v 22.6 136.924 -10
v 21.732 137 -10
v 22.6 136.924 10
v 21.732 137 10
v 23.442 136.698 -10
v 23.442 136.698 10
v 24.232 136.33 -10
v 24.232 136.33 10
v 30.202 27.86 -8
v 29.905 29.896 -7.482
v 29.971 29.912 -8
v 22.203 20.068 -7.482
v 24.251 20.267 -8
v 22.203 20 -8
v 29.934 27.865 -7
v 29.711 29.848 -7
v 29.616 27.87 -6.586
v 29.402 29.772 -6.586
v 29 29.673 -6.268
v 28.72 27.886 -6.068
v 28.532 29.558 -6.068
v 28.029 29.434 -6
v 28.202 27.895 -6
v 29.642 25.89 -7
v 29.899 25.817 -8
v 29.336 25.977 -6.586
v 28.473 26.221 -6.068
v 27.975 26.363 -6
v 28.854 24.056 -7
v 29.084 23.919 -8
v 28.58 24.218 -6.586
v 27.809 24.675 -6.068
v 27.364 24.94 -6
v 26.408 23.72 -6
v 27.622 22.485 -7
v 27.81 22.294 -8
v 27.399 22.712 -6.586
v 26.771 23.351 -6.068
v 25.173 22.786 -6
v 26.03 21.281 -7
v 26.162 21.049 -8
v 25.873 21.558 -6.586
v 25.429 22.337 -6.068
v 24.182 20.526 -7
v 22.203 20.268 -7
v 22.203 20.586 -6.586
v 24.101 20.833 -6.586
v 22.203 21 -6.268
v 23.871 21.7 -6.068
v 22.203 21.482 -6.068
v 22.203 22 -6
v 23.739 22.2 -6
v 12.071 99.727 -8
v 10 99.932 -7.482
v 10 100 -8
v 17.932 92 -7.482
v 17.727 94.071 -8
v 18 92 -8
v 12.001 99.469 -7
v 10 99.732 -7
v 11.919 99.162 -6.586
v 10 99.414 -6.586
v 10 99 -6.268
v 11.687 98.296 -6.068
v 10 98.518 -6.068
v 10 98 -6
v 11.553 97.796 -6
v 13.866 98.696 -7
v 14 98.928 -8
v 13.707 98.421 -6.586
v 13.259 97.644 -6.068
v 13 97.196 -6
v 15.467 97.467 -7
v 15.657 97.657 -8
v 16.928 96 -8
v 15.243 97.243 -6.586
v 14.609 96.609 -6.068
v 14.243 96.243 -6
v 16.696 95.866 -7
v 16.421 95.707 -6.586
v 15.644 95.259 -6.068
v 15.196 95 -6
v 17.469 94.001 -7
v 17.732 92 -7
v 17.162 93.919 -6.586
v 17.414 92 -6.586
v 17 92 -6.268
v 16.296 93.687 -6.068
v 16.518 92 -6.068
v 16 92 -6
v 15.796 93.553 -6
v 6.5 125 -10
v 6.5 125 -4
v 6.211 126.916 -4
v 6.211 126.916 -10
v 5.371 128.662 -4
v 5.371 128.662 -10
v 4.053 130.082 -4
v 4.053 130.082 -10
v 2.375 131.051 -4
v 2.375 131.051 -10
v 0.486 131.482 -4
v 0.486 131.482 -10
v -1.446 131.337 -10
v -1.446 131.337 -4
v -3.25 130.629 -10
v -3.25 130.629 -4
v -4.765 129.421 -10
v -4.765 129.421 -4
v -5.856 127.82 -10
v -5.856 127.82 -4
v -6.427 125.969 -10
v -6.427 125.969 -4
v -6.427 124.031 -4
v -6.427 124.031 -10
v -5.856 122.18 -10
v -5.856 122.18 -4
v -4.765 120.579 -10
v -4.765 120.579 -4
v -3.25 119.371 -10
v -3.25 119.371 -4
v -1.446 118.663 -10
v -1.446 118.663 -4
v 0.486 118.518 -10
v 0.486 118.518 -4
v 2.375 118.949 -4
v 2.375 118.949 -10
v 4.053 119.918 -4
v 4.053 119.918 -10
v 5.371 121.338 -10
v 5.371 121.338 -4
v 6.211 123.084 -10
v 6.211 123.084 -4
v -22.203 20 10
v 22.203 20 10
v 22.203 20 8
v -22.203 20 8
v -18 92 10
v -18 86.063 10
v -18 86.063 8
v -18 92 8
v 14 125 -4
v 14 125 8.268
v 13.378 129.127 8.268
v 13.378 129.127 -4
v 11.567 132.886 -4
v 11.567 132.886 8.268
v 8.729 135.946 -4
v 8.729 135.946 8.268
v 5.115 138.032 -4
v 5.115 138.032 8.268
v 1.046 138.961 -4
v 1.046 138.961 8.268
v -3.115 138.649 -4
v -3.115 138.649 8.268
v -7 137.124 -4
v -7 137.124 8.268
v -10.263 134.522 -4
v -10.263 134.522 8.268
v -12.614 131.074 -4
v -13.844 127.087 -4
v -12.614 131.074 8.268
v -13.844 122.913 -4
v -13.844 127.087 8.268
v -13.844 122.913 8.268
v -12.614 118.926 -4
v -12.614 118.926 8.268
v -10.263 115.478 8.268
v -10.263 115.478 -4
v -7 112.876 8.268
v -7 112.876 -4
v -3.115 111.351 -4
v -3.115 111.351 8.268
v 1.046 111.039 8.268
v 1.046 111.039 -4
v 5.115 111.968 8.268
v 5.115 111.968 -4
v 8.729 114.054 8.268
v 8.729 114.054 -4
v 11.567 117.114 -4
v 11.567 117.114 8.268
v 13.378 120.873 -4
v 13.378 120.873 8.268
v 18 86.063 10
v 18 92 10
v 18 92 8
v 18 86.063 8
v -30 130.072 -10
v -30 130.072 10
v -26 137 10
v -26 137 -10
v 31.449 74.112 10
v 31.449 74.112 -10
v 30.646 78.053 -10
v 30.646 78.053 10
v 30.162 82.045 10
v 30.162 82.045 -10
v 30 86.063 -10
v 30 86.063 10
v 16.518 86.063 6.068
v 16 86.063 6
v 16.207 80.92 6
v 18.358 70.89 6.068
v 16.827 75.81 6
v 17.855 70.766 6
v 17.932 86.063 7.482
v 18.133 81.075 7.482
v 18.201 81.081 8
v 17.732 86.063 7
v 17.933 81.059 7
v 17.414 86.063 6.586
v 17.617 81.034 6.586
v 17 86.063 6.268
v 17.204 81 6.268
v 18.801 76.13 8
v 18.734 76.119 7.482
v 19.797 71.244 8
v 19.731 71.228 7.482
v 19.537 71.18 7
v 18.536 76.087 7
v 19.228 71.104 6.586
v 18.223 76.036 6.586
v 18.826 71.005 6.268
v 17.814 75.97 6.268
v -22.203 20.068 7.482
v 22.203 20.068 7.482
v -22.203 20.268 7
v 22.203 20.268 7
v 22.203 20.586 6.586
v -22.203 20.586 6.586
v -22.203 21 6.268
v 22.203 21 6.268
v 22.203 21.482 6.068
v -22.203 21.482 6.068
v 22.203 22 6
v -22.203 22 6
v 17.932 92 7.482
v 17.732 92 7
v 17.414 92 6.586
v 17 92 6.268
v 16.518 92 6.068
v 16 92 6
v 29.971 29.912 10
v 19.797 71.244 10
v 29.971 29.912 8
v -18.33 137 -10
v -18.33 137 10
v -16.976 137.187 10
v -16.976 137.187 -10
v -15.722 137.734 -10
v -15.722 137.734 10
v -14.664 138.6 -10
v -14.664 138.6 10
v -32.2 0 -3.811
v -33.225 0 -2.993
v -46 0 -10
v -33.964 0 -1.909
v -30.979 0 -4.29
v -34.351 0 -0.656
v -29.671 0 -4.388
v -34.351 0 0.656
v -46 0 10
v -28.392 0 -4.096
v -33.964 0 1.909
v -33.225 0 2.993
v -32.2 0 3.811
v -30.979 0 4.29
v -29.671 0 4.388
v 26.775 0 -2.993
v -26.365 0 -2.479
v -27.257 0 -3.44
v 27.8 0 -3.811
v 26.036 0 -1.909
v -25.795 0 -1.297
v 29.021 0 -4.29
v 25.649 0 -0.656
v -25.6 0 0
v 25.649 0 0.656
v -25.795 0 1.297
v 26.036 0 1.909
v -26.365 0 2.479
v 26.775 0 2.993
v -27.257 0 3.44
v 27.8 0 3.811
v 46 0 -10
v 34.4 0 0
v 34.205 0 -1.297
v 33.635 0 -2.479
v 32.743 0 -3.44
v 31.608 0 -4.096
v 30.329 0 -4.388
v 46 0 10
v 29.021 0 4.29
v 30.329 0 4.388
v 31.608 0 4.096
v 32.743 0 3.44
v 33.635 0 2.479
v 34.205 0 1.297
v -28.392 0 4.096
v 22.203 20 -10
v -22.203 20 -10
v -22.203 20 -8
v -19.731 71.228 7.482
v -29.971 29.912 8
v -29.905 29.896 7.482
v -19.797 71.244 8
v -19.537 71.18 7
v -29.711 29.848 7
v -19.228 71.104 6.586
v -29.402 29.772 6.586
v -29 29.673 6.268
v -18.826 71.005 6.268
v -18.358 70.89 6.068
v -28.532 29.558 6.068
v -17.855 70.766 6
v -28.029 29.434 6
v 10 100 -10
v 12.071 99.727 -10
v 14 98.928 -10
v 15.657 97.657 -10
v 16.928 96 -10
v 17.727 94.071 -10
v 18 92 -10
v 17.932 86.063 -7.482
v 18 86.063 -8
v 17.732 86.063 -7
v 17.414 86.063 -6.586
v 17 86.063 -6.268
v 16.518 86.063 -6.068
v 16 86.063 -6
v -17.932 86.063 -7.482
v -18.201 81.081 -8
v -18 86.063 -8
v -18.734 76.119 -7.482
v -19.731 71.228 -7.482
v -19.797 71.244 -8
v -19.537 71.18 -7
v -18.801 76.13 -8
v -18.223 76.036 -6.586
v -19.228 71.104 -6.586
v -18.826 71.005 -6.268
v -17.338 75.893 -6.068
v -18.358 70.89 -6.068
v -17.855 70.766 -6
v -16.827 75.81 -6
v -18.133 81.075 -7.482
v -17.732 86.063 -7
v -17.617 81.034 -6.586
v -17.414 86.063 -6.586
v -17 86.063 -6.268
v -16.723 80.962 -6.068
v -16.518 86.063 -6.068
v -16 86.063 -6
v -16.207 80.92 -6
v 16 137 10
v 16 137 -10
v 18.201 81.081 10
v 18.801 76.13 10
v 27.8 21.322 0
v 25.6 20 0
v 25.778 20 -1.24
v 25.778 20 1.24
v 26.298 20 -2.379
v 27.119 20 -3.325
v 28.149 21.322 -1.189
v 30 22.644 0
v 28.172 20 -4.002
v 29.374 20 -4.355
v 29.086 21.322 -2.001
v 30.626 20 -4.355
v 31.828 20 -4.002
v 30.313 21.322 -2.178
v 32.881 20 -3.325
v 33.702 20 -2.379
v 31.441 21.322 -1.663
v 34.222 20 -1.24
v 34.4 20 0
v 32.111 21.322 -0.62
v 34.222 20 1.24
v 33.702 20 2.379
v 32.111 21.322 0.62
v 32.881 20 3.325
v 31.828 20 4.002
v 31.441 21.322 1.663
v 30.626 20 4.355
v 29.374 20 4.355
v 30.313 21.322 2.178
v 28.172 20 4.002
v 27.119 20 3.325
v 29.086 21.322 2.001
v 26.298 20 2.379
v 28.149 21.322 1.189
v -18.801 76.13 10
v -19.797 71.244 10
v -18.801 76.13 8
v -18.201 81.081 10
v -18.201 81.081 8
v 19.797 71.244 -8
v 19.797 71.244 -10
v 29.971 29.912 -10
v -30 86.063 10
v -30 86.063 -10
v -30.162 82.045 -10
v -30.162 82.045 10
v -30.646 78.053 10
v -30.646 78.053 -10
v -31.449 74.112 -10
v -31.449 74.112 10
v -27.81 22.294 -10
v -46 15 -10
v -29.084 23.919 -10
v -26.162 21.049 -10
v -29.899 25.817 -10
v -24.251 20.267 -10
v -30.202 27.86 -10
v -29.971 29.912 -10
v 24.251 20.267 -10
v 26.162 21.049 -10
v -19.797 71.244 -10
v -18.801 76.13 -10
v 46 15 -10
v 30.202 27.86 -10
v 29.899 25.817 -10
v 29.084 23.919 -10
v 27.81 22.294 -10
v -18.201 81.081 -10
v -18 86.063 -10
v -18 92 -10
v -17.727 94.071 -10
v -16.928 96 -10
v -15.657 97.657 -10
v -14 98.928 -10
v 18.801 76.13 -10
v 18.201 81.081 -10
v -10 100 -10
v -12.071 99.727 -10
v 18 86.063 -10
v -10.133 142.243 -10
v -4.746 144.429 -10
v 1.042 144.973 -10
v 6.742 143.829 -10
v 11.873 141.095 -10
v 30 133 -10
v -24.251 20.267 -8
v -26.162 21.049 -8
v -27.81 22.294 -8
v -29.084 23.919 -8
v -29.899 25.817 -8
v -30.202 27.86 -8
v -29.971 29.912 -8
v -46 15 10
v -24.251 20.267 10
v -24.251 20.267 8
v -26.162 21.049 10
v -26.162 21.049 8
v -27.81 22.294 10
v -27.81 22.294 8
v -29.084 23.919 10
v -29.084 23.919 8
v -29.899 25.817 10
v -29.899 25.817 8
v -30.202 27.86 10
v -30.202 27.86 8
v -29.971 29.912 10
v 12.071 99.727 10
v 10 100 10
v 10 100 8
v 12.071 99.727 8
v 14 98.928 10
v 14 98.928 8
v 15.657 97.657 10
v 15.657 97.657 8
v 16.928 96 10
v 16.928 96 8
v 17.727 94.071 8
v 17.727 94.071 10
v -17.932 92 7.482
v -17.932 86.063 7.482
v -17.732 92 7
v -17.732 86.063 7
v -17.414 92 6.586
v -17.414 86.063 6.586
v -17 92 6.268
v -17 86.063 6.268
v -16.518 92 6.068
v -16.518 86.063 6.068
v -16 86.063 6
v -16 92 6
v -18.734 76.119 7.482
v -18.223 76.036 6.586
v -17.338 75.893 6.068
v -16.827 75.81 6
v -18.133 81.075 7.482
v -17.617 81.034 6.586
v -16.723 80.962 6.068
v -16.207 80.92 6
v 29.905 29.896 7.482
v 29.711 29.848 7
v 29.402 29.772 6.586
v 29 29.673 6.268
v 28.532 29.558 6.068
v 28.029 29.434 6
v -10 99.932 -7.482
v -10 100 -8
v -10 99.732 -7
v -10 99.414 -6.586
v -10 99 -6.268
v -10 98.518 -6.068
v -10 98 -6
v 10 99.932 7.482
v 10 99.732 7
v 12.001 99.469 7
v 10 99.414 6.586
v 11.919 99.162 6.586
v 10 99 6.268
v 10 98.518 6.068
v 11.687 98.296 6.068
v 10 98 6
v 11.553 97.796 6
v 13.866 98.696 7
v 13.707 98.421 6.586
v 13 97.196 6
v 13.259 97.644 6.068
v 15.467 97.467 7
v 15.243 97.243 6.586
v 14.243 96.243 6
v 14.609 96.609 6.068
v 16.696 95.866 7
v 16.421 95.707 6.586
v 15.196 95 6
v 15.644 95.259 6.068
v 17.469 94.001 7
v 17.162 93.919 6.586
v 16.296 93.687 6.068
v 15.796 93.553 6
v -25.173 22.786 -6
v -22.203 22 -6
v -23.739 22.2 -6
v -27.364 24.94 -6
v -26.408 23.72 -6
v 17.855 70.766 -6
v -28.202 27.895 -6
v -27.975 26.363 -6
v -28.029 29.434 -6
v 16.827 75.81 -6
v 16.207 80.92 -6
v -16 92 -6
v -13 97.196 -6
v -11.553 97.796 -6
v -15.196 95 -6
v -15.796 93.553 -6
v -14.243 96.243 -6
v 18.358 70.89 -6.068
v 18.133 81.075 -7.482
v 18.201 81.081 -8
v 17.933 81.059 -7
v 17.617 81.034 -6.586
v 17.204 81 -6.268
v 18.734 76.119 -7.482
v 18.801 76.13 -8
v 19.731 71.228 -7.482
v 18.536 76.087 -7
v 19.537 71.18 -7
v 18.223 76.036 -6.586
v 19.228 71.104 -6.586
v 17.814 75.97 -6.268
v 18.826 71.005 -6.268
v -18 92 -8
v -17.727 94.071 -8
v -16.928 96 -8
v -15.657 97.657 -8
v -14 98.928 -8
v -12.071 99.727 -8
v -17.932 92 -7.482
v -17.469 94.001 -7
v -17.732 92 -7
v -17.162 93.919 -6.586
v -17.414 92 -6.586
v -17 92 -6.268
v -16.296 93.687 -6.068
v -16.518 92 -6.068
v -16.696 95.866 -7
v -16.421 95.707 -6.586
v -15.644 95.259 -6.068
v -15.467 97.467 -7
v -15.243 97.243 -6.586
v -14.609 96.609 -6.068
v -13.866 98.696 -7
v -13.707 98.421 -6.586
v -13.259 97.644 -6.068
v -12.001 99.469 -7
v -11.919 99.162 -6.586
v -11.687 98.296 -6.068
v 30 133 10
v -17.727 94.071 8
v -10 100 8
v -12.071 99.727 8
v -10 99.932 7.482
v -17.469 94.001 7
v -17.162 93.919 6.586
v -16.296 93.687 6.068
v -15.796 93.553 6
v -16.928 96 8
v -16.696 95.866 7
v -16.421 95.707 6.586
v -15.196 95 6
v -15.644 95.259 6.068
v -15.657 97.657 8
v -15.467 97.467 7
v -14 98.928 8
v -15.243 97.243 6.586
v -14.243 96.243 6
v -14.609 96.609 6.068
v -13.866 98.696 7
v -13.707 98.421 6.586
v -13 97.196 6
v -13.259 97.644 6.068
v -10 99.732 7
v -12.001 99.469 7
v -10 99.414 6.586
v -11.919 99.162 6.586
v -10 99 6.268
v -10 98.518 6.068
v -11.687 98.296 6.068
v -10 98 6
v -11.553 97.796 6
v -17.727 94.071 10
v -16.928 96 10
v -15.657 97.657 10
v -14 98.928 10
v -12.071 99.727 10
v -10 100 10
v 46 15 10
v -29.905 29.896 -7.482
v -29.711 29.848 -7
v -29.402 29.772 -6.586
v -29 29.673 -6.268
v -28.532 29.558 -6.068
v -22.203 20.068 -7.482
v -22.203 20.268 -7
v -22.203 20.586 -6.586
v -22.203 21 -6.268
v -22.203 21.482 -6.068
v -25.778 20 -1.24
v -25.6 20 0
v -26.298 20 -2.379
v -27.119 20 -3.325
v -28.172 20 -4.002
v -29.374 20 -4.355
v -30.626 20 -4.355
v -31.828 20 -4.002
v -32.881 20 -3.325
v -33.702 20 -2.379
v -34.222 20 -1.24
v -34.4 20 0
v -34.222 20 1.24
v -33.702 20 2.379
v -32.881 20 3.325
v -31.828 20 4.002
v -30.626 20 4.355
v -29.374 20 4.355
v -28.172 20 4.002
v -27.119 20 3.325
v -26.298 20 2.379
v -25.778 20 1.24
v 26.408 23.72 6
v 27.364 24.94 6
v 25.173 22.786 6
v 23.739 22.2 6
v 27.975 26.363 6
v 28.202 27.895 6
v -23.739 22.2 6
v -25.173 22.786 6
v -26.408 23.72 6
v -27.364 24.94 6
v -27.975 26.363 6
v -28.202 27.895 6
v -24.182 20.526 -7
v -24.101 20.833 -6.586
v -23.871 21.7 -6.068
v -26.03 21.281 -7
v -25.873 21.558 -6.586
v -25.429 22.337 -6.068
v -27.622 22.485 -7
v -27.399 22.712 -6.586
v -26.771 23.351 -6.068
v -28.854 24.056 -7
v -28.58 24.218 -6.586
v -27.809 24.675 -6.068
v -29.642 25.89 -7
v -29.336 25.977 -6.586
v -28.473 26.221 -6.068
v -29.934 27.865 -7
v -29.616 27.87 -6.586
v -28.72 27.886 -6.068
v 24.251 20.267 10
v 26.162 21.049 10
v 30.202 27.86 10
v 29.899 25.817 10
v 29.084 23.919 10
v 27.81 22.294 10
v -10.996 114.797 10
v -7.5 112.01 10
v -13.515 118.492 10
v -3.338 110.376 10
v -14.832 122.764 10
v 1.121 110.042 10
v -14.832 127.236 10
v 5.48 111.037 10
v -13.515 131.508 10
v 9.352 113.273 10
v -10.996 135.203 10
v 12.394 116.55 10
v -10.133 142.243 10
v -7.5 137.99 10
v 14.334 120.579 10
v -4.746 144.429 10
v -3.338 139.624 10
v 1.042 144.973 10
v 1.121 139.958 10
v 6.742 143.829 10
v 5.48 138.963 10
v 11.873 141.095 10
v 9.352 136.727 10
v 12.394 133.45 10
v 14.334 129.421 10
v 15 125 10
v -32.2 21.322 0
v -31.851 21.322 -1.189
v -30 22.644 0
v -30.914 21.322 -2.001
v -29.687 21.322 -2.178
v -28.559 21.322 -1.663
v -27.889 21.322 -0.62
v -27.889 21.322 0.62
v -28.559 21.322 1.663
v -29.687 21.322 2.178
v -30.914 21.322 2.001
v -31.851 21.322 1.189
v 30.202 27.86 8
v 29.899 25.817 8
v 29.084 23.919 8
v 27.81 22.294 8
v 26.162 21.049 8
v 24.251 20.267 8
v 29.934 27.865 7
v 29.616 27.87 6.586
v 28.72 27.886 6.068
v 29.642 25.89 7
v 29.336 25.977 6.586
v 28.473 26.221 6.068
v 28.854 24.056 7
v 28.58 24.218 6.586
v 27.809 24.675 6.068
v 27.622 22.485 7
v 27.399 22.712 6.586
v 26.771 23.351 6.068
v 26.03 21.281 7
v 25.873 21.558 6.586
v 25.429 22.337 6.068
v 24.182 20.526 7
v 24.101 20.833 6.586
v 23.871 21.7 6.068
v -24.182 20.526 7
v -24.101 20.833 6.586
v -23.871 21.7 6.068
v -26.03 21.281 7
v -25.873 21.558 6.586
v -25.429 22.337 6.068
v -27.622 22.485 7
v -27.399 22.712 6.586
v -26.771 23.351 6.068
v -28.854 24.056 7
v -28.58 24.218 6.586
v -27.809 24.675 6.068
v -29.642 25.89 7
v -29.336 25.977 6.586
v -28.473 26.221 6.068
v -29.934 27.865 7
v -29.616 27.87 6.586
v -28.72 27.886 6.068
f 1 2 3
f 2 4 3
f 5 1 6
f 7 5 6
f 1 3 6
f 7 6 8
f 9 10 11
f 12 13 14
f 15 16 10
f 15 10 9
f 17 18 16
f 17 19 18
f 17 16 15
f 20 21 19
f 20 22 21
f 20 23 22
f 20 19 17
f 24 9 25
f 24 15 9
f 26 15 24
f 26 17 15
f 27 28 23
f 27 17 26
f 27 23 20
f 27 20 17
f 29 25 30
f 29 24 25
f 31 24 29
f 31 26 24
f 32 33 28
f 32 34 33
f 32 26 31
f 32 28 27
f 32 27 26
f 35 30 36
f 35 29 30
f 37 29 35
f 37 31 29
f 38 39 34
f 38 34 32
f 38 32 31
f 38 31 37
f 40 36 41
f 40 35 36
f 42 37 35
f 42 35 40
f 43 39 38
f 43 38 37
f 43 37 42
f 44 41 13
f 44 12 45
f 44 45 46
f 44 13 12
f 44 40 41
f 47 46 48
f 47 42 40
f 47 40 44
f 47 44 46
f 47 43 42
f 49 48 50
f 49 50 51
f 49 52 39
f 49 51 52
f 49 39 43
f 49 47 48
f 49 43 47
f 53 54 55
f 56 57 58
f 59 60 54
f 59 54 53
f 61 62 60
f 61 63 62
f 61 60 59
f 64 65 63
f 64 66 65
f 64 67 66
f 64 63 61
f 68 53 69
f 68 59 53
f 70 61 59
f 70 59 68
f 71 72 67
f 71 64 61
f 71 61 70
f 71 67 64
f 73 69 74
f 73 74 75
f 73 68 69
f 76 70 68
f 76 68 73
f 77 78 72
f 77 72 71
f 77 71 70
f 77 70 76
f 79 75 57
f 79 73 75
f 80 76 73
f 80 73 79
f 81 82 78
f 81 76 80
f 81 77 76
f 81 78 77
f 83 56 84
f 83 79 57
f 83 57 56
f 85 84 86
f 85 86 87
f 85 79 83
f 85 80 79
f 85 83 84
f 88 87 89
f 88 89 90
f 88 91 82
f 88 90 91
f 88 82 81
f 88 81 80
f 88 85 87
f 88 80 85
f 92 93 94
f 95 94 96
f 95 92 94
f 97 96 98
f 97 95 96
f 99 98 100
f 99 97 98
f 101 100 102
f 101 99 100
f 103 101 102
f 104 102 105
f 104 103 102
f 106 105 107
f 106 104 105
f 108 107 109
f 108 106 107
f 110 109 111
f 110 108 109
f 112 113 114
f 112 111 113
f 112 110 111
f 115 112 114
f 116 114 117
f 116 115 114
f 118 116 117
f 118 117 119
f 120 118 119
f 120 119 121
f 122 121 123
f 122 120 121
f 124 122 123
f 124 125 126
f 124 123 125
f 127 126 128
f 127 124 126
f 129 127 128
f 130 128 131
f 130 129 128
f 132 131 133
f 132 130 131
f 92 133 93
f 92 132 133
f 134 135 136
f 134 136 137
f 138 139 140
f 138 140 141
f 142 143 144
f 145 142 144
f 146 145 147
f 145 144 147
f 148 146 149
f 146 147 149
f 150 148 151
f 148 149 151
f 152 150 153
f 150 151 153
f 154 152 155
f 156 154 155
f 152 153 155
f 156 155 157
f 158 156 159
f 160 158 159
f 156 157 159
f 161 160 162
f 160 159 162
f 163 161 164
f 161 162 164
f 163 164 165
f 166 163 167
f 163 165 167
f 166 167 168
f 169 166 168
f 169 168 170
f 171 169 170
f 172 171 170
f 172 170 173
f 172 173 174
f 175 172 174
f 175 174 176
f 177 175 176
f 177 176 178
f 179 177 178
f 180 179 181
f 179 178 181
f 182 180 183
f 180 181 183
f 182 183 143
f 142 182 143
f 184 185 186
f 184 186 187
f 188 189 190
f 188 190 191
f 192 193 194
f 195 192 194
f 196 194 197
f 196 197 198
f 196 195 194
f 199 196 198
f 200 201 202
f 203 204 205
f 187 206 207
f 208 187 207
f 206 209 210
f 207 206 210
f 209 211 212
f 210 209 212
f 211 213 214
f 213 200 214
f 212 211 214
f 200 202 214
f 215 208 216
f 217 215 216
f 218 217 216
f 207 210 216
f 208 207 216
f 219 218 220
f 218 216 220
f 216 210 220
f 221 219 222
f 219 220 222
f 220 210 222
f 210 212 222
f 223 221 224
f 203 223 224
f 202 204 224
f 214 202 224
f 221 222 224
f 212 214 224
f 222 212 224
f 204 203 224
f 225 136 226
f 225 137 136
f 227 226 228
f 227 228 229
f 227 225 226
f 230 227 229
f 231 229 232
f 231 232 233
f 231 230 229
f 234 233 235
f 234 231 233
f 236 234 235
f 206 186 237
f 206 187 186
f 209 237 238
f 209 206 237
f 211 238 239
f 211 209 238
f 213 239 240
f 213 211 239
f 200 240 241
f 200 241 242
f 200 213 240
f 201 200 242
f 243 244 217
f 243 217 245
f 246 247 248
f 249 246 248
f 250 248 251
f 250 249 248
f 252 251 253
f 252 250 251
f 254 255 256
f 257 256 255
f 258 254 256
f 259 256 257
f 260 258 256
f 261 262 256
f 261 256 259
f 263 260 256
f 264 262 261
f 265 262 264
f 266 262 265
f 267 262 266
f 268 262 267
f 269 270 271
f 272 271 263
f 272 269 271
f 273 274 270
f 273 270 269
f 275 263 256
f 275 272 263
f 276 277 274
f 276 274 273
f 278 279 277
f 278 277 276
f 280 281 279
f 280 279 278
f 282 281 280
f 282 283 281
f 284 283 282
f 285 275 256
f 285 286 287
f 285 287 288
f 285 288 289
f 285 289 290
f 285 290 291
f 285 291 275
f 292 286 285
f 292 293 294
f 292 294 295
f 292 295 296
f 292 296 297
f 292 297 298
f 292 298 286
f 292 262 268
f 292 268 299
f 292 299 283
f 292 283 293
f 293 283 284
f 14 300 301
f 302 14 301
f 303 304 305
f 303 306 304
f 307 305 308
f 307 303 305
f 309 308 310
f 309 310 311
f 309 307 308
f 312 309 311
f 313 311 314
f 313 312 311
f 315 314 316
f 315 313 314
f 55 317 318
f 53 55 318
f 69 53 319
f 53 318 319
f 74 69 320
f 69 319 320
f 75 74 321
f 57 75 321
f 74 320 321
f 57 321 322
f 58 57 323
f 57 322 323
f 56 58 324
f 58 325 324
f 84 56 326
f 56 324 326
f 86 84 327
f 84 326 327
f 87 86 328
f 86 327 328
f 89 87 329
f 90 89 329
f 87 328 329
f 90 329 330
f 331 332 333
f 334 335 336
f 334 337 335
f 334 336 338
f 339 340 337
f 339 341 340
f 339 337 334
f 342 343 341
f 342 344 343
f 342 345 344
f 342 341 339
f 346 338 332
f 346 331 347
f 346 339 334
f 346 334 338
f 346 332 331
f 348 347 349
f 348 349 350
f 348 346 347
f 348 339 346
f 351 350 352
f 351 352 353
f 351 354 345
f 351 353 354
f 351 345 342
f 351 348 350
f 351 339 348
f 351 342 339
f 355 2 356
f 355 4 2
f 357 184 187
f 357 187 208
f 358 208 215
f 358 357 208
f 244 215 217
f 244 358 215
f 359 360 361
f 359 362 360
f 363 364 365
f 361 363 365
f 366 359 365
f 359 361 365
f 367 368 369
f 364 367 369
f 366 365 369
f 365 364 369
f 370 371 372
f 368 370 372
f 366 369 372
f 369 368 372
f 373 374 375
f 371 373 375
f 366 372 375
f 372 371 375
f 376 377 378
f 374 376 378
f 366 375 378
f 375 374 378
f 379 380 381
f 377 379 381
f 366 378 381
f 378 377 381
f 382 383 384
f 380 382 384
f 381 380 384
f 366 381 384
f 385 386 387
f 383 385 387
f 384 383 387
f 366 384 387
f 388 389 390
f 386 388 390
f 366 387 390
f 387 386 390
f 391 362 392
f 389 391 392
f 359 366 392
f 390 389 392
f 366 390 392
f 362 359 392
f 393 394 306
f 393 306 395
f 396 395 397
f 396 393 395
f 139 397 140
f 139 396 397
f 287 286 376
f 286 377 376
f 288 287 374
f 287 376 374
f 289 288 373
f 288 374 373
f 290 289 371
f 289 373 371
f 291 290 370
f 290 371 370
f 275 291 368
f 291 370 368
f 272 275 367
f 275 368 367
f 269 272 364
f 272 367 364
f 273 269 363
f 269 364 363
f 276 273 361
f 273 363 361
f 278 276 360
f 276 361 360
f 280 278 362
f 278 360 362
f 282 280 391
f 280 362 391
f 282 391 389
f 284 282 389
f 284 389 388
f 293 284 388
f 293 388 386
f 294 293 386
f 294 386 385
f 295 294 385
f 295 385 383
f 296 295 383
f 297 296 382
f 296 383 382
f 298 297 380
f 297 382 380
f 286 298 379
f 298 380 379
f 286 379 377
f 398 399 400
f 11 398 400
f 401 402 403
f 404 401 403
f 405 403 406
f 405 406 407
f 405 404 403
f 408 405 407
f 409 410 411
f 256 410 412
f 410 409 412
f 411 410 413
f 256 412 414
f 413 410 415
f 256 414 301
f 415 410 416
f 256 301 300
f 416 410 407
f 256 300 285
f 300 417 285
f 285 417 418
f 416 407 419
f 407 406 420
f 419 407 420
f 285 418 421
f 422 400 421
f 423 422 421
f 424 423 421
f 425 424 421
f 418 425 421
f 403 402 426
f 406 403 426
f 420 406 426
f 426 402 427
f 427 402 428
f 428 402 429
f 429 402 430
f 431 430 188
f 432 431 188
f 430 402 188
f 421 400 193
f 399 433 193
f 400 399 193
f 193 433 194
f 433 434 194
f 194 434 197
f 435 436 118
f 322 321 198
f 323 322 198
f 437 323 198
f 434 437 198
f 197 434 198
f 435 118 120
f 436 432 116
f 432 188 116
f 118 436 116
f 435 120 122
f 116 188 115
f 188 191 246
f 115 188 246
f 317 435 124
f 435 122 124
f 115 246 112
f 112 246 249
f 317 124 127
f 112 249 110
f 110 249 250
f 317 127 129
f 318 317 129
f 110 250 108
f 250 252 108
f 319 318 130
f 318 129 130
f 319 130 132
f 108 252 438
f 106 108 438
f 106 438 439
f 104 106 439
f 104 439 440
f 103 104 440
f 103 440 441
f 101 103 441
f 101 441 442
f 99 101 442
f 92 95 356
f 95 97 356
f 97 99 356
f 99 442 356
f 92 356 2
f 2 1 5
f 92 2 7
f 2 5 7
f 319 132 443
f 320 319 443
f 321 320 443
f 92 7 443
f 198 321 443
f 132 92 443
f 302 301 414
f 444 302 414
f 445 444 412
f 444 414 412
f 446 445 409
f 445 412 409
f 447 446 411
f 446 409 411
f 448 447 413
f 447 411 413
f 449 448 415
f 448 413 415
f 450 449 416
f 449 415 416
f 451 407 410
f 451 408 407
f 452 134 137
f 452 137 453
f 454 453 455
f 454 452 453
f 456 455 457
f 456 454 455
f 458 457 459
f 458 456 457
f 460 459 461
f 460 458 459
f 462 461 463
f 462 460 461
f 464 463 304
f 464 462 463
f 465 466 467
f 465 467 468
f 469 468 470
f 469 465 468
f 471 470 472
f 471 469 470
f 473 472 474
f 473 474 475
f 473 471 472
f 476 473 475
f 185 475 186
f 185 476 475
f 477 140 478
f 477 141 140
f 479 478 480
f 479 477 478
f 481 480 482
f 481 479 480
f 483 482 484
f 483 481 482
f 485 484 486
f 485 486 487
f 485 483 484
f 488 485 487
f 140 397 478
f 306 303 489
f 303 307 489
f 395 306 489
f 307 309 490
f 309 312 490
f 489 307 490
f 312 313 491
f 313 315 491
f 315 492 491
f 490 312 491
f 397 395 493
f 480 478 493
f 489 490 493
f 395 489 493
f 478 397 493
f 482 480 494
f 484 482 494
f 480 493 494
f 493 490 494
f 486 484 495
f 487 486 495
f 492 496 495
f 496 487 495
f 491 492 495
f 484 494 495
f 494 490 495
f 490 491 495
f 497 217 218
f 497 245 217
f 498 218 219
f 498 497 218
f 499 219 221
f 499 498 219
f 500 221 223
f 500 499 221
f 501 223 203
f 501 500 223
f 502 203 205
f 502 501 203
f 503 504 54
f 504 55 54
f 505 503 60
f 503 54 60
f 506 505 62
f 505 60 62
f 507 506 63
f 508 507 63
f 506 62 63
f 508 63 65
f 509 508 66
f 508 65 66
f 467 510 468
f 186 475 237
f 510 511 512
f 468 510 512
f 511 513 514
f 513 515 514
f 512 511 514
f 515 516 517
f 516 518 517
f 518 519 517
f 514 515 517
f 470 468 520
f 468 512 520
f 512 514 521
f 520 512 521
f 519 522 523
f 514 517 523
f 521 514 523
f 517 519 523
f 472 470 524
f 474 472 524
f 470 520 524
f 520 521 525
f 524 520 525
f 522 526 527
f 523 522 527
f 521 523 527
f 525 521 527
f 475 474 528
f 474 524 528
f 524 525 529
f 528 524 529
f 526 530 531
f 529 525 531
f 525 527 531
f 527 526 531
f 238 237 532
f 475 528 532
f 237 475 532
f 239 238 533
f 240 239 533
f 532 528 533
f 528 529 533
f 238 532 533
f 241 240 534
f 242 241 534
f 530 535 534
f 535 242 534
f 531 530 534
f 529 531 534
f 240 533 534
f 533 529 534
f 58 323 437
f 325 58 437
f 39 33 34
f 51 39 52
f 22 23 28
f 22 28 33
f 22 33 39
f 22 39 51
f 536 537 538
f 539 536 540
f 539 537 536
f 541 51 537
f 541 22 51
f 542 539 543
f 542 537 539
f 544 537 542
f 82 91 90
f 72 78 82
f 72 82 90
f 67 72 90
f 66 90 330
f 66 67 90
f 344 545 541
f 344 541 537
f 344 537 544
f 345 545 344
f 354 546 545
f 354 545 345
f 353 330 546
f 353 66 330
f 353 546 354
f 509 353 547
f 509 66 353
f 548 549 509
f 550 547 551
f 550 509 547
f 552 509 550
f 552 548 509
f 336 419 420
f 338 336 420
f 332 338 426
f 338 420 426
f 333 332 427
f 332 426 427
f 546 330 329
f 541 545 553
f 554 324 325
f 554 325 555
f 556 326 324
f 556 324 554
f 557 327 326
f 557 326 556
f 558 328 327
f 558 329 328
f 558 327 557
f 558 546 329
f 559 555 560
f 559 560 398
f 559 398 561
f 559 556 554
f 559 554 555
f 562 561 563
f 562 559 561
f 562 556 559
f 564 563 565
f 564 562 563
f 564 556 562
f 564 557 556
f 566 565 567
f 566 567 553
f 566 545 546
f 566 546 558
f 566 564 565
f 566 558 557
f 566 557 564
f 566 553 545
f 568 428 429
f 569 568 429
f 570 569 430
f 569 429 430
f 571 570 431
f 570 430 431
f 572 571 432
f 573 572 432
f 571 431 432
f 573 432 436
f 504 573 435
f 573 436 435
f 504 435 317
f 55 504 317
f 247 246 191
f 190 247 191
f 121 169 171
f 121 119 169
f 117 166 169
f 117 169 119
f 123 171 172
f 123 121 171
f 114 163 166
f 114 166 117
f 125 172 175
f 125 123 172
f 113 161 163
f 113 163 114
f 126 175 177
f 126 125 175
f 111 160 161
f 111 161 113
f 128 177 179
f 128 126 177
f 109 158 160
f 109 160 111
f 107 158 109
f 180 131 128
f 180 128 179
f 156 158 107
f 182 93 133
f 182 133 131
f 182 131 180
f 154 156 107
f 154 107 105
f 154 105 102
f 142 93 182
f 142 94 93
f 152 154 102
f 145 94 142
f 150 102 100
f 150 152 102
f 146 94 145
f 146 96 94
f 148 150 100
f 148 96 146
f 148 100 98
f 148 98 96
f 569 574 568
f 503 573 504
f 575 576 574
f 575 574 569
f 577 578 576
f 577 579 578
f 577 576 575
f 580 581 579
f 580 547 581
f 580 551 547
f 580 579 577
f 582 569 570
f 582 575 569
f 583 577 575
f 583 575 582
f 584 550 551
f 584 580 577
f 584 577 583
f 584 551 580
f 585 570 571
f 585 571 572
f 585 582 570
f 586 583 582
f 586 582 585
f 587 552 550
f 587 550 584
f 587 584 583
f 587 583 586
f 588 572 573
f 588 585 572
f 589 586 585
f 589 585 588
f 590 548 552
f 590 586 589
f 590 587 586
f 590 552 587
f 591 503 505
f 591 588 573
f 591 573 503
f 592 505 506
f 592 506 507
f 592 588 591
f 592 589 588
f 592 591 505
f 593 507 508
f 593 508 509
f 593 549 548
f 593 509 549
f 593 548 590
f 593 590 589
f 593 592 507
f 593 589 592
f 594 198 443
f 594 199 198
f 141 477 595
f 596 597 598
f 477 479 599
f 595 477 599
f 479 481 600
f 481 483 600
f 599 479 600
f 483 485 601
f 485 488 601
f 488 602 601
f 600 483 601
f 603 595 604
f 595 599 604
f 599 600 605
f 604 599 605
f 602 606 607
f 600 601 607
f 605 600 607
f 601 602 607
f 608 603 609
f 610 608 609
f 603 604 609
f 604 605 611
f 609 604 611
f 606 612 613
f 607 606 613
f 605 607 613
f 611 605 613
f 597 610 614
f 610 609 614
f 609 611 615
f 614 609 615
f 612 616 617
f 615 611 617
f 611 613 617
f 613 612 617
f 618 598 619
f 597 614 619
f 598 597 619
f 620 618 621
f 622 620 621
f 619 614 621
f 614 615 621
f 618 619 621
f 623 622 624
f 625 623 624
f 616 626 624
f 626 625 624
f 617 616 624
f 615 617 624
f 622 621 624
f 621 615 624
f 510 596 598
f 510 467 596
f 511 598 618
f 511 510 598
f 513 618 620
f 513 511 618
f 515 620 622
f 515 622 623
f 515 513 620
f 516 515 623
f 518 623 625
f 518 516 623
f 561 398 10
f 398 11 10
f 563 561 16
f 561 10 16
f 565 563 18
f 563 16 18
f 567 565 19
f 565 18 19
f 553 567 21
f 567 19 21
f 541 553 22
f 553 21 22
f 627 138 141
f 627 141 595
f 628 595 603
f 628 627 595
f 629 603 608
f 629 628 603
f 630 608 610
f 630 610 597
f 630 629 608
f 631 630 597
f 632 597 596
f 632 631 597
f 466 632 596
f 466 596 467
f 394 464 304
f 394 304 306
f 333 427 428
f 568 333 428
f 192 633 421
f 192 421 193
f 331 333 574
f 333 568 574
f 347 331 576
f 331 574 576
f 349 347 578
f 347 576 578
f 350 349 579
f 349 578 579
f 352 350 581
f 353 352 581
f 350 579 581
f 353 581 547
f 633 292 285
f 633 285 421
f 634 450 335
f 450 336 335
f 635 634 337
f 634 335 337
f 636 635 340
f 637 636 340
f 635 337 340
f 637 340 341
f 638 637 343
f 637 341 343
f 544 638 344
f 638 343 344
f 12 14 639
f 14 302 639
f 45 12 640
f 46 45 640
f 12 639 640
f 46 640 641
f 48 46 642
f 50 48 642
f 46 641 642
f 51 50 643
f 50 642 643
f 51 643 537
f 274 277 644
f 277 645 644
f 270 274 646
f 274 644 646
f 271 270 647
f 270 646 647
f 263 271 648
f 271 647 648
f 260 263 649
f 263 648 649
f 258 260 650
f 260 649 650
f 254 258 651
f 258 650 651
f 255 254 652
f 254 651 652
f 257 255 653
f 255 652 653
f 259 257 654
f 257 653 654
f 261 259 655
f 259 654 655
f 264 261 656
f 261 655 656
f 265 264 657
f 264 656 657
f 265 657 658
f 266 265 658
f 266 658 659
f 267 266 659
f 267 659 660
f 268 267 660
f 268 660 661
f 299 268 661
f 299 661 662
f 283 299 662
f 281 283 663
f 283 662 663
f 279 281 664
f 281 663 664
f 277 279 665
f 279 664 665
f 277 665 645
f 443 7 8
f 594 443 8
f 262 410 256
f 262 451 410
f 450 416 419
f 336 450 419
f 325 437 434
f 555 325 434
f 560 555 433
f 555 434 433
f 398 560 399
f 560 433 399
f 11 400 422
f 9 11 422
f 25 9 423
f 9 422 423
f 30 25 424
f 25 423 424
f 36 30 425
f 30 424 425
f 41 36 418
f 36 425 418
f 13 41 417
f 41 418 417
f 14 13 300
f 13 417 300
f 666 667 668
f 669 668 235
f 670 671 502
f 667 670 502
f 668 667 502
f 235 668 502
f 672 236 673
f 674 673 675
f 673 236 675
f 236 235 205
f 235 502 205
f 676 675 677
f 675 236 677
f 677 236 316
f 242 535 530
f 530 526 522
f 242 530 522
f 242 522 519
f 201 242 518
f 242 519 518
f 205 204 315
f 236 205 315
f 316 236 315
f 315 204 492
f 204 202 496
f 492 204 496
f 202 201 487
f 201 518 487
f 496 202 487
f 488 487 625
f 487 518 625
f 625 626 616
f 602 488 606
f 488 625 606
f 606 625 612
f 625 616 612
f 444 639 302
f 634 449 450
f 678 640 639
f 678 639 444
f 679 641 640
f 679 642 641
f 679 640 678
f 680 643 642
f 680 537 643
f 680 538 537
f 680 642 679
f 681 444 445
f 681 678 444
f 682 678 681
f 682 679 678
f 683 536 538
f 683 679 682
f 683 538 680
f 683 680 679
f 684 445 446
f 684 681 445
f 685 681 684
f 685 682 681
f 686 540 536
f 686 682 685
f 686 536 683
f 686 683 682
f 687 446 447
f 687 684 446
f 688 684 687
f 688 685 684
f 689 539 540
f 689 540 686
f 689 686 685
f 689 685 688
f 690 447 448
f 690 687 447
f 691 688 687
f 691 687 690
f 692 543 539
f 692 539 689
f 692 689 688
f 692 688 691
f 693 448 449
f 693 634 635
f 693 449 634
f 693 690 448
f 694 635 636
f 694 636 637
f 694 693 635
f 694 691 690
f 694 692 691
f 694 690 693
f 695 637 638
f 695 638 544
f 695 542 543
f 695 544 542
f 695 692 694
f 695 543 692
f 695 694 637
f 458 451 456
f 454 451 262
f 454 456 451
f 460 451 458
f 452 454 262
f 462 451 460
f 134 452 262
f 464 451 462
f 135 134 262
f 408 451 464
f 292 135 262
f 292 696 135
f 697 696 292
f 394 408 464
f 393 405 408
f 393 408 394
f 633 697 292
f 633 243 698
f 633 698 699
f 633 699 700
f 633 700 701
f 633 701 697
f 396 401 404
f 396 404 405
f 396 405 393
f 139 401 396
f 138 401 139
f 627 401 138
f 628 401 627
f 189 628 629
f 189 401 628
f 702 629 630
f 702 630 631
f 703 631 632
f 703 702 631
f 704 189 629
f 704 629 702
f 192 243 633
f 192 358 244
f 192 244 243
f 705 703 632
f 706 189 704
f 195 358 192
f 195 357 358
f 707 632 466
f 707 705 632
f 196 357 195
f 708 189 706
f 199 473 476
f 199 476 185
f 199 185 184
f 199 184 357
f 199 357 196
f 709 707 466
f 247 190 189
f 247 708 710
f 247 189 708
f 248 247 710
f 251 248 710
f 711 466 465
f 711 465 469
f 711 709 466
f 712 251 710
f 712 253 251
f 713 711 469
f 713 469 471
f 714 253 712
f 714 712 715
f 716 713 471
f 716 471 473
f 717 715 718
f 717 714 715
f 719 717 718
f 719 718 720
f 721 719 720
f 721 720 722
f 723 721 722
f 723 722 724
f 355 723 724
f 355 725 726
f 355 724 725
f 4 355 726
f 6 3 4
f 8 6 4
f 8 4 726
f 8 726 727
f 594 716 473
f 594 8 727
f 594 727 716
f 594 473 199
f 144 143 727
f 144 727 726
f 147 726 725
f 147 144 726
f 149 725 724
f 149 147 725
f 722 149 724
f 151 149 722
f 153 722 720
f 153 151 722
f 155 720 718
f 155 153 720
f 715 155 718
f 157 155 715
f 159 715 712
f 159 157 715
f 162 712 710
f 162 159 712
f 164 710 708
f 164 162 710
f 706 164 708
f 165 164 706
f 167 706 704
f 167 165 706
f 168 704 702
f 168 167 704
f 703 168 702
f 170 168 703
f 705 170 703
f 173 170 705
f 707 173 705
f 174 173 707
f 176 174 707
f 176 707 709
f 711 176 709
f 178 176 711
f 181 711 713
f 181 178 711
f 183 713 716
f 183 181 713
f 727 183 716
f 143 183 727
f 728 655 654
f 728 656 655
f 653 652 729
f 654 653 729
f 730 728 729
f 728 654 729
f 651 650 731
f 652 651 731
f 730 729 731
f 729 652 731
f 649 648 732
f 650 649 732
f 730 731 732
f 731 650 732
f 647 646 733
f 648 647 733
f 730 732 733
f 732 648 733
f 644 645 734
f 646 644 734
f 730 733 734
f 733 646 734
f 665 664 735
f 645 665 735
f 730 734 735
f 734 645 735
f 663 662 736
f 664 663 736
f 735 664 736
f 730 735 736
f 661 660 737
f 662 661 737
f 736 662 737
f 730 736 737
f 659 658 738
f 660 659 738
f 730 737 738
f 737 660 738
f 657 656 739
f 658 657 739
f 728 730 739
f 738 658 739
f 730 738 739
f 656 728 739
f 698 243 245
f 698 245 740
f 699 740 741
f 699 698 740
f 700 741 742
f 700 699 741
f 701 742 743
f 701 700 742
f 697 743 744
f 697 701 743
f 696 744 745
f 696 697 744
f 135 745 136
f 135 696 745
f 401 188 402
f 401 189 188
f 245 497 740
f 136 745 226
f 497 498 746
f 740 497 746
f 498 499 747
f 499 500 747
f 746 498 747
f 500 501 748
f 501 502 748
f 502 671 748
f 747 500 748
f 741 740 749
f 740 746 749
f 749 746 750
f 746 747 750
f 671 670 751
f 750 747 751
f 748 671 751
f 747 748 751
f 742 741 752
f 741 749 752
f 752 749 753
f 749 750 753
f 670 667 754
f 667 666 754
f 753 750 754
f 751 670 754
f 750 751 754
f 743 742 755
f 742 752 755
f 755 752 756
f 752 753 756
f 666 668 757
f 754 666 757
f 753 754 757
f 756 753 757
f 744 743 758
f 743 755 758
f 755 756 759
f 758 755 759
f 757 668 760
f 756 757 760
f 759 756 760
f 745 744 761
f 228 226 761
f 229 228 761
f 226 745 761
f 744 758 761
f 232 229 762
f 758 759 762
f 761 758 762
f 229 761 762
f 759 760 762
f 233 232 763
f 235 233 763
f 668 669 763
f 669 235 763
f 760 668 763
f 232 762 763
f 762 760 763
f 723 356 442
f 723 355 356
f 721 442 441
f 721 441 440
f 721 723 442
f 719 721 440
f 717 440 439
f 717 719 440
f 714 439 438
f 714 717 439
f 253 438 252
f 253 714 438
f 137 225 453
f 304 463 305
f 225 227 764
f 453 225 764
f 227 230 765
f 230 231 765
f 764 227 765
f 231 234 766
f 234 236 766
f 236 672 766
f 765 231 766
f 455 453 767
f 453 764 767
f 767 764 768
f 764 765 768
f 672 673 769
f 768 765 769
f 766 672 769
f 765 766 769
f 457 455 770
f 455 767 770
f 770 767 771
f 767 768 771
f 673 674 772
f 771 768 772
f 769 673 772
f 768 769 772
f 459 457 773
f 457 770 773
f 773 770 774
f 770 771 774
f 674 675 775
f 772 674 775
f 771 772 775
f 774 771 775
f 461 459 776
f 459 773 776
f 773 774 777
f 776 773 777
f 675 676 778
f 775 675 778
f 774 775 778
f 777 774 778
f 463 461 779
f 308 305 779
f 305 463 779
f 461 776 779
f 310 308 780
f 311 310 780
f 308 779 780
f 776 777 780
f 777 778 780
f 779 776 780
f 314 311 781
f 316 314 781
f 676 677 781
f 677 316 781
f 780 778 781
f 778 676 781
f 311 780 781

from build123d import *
from OCP.BRepFilletAPI import BRepFilletAPI_MakeChamfer

# Parameters (mm, degrees)
SKETCH1_R                   = 6.5
BOSS_EXTRUDE1_DEPTH         = 10
SKETCH2_R                   = 14
CUT_EXTRUDE1_DEPTH          = 14
CHAMFER1_SIZE               = 1
CHAMFER1_SIZE2              = 1.732050808
CHAMFER2_SIZE               = 4
CHAMFER2_SIZE2              = 6.92820323
FILLET1_R                   = 5
CUT_EXTRUDE2_DEPTH          = 4
FILLET2_R                   = 2
FILLET2_OF_MIRROR1_R        = 2
M10X1_25_TAPPED_HOLE1_D     = 8.8
M10X1_25_TAPPED_HOLE1_DEPTH = 20
M10X1_25_TAPPED_HOLE1_TIP   = 2.643786724


with BuildPart() as part:
    # Sketch1 → Boss-Extrude1 (new, symmetric)
    with BuildSketch(Plane.XY):
        with BuildLine():
            Line((-46, 0), (46, 0))
            Line((46, 0), (46, 15))
            Line((46, 15), (31.449256053, 74.112397284))
            ThreePointArc((31.449256053, 74.112397284), (30.363636327, 80.044097084), (30, 86.06334964))
            Line((30, 86.06334964), (30, 137))
            Line((30, 137), (16, 137))
            ThreePointArc((16, 137), (0, 145), (-16, 137))
            Line((-16, 137), (-30, 137))
            Line((-30, 137), (-30, 86.06334964))
            ThreePointArc((-30, 86.06334964), (-30.363636327, 80.044097084), (-31.449256053, 74.112397284))
            Line((-31.449256053, 74.112397284), (-46, 15))
            Line((-46, 15), (-46, 0))
        make_face()
        with Locations((0, 125)):
            Circle(SKETCH1_R, mode=Mode.SUBTRACT)
    extrude(amount=BOSS_EXTRUDE1_DEPTH, both=True)

    # Sketch2 → Cut-Extrude1 (cut)
    with BuildSketch(Plane.XY.offset(10)):
        with Locations((0, 125)):
            Circle(SKETCH2_R)
    extrude(amount=-CUT_EXTRUDE1_DEPTH, mode=Mode.SUBTRACT)

    # Chamfer1
    chamfer1_edges = [part.edges().sort_by_distance(p)[0] for p in [
        (-14, 125, 10),
    ]]
    chamfer1_side = [part.faces().sort_by_distance(p)[0] for p in [
        (0, 59.441099991, 10),
    ]]
    chamfer(chamfer1_edges, length=CHAMFER1_SIZE, length2=CHAMFER1_SIZE2, reference=chamfer1_side[0])

    # Chamfer2: one chamfer whose edges measure the first distance from different faces: ONE call of the kernel's chamfer builder (chamfer() names one face for all edges)
    chamfer2_edges_1 = [part.edges().sort_by_distance(p)[0] for p in [
        (-30, 137, 0),
    ]]
    chamfer2_side_1 = [part.faces().sort_by_distance(p)[0] for p in [
        (-23, 137, 0),
    ]]
    chamfer2_edges_2 = [part.edges().sort_by_distance(p)[0] for p in [
        (30, 137, 0),
    ]]
    chamfer2_side_2 = [part.faces().sort_by_distance(p)[0] for p in [
        (30, 111.53167482, 0),
    ]]
    chamfer2 = BRepFilletAPI_MakeChamfer(part.part.solid().wrapped)
    for e in chamfer2_edges_1:
        chamfer2.Add(CHAMFER2_SIZE, CHAMFER2_SIZE2, e.wrapped, chamfer2_side_1[0].wrapped)  # the first distance lies on this face
    for e in chamfer2_edges_2:
        chamfer2.Add(CHAMFER2_SIZE, CHAMFER2_SIZE2, e.wrapped, chamfer2_side_2[0].wrapped)  # the first distance lies on this face
    add(Compound.cast(chamfer2.Shape()), mode=Mode.REPLACE)

    # Fillet1
    fillet1_edges = [part.edges().sort_by_distance(p)[0] for p in [
        (-16, 137, 0),
        (23.07179677, 137, 0),
    ]]
    fillet(fillet1_edges, radius=FILLET1_R)

    # Sketch4 → Cut-Extrude2 (cut)
    with BuildSketch(Plane.XY.offset(10)):
        with BuildLine():
            ThreePointArc((-19.797077506, 71.244168718), (-18.450909046, 78.59947647), (-18, 86.06334964))
            Line((-18, 86.06334964), (-18, 92))
            ThreePointArc((-18, 92), (-15.656854249, 97.656854249), (-10, 100))
            Line((-10, 100), (10, 100))
            ThreePointArc((10, 100), (15.656854249, 97.656854249), (18, 92))
            Line((18, 92), (18, 86.06334964))
            ThreePointArc((18, 86.06334964), (18.450909046, 78.59947647), (19.797077506, 71.244168718))
            Line((19.797077506, 71.244168718), (29.971112298, 29.912152377))
            ThreePointArc((29.971112298, 29.912152377), (28.49970745, 23.065287193), (22.202993266, 20))
            Line((22.202993266, 20), (-22.202993266, 20))
            ThreePointArc((-22.202993266, 20), (-28.49970745, 23.065287193), (-29.971112298, 29.912152377))
            Line((-29.971112298, 29.912152377), (-19.797077506, 71.244168718))
        make_face()
    cut_extrude2 = extrude(amount=-CUT_EXTRUDE2_DEPTH, mode=Mode.SUBTRACT)

    # Fillet2
    fillet2_edges = [part.edges().sort_by_distance(p)[0] for p in [
        (-18, 89.03167482, 6),
        (-15.656854249, 97.656854249, 6),
        (18, 89.03167482, 6),
        (24.884094902, 50.578160548, 6),
        (28.49970745, 23.065287193, 6),
        (0, 20, 6),
        (-24.884094902, 50.578160548, 6),
        (-18.450909046, 78.59947647, 6),
        (0, 100, 6),
        (15.656854249, 97.656854249, 6),
        (18.450909046, 78.59947647, 6),
        (-28.49970745, 23.065287193, 6),
    ]]
    fillet(fillet2_edges, radius=FILLET2_R)

    # Mirror1: Cut-Extrude2 across plane
    add(cut_extrude2.mirror(Plane.XY), mode=Mode.SUBTRACT)

    # Fillet2 of Mirror1
    fillet2_of_mirror1_edges = [part.edges().sort_by_distance(p)[0] for p in [
        (-18, 89.03167482, -6),
        (-15.656854249, 97.656854249, -6),
        (18, 89.03167482, -6),
        (24.884094902, 50.578160548, -6),
        (28.49970745, 23.065287193, -6),
        (0, 20, -6),
        (-24.884094902, 50.578160548, -6),
        (-18.450909046, 78.59947647, -6),
        (0, 100, -6),
        (15.656854249, 97.656854249, -6),
        (18.450909046, 78.59947647, -6),
        (-28.49970745, 23.065287193, -6),
    ]]
    fillet(fillet2_of_mirror1_edges, radius=FILLET2_OF_MIRROR1_R)

    # M10x1.25 Tapped Hole1
    with Locations(Plane(origin=(0, 0, 0), x_dir=(-1, 0, 0), z_dir=(0, -1, 0))):
        with Locations((-30, 0), (30, 0)):
            Hole(M10X1_25_TAPPED_HOLE1_D / 2, depth=M10X1_25_TAPPED_HOLE1_DEPTH)
            with Locations((0, 0, -(M10X1_25_TAPPED_HOLE1_DEPTH + M10X1_25_TAPPED_HOLE1_TIP / 2))):  # 118° drill point
                Cone(0, M10X1_25_TAPPED_HOLE1_D / 2, M10X1_25_TAPPED_HOLE1_TIP, mode=Mode.SUBTRACT)


solid = part.part
